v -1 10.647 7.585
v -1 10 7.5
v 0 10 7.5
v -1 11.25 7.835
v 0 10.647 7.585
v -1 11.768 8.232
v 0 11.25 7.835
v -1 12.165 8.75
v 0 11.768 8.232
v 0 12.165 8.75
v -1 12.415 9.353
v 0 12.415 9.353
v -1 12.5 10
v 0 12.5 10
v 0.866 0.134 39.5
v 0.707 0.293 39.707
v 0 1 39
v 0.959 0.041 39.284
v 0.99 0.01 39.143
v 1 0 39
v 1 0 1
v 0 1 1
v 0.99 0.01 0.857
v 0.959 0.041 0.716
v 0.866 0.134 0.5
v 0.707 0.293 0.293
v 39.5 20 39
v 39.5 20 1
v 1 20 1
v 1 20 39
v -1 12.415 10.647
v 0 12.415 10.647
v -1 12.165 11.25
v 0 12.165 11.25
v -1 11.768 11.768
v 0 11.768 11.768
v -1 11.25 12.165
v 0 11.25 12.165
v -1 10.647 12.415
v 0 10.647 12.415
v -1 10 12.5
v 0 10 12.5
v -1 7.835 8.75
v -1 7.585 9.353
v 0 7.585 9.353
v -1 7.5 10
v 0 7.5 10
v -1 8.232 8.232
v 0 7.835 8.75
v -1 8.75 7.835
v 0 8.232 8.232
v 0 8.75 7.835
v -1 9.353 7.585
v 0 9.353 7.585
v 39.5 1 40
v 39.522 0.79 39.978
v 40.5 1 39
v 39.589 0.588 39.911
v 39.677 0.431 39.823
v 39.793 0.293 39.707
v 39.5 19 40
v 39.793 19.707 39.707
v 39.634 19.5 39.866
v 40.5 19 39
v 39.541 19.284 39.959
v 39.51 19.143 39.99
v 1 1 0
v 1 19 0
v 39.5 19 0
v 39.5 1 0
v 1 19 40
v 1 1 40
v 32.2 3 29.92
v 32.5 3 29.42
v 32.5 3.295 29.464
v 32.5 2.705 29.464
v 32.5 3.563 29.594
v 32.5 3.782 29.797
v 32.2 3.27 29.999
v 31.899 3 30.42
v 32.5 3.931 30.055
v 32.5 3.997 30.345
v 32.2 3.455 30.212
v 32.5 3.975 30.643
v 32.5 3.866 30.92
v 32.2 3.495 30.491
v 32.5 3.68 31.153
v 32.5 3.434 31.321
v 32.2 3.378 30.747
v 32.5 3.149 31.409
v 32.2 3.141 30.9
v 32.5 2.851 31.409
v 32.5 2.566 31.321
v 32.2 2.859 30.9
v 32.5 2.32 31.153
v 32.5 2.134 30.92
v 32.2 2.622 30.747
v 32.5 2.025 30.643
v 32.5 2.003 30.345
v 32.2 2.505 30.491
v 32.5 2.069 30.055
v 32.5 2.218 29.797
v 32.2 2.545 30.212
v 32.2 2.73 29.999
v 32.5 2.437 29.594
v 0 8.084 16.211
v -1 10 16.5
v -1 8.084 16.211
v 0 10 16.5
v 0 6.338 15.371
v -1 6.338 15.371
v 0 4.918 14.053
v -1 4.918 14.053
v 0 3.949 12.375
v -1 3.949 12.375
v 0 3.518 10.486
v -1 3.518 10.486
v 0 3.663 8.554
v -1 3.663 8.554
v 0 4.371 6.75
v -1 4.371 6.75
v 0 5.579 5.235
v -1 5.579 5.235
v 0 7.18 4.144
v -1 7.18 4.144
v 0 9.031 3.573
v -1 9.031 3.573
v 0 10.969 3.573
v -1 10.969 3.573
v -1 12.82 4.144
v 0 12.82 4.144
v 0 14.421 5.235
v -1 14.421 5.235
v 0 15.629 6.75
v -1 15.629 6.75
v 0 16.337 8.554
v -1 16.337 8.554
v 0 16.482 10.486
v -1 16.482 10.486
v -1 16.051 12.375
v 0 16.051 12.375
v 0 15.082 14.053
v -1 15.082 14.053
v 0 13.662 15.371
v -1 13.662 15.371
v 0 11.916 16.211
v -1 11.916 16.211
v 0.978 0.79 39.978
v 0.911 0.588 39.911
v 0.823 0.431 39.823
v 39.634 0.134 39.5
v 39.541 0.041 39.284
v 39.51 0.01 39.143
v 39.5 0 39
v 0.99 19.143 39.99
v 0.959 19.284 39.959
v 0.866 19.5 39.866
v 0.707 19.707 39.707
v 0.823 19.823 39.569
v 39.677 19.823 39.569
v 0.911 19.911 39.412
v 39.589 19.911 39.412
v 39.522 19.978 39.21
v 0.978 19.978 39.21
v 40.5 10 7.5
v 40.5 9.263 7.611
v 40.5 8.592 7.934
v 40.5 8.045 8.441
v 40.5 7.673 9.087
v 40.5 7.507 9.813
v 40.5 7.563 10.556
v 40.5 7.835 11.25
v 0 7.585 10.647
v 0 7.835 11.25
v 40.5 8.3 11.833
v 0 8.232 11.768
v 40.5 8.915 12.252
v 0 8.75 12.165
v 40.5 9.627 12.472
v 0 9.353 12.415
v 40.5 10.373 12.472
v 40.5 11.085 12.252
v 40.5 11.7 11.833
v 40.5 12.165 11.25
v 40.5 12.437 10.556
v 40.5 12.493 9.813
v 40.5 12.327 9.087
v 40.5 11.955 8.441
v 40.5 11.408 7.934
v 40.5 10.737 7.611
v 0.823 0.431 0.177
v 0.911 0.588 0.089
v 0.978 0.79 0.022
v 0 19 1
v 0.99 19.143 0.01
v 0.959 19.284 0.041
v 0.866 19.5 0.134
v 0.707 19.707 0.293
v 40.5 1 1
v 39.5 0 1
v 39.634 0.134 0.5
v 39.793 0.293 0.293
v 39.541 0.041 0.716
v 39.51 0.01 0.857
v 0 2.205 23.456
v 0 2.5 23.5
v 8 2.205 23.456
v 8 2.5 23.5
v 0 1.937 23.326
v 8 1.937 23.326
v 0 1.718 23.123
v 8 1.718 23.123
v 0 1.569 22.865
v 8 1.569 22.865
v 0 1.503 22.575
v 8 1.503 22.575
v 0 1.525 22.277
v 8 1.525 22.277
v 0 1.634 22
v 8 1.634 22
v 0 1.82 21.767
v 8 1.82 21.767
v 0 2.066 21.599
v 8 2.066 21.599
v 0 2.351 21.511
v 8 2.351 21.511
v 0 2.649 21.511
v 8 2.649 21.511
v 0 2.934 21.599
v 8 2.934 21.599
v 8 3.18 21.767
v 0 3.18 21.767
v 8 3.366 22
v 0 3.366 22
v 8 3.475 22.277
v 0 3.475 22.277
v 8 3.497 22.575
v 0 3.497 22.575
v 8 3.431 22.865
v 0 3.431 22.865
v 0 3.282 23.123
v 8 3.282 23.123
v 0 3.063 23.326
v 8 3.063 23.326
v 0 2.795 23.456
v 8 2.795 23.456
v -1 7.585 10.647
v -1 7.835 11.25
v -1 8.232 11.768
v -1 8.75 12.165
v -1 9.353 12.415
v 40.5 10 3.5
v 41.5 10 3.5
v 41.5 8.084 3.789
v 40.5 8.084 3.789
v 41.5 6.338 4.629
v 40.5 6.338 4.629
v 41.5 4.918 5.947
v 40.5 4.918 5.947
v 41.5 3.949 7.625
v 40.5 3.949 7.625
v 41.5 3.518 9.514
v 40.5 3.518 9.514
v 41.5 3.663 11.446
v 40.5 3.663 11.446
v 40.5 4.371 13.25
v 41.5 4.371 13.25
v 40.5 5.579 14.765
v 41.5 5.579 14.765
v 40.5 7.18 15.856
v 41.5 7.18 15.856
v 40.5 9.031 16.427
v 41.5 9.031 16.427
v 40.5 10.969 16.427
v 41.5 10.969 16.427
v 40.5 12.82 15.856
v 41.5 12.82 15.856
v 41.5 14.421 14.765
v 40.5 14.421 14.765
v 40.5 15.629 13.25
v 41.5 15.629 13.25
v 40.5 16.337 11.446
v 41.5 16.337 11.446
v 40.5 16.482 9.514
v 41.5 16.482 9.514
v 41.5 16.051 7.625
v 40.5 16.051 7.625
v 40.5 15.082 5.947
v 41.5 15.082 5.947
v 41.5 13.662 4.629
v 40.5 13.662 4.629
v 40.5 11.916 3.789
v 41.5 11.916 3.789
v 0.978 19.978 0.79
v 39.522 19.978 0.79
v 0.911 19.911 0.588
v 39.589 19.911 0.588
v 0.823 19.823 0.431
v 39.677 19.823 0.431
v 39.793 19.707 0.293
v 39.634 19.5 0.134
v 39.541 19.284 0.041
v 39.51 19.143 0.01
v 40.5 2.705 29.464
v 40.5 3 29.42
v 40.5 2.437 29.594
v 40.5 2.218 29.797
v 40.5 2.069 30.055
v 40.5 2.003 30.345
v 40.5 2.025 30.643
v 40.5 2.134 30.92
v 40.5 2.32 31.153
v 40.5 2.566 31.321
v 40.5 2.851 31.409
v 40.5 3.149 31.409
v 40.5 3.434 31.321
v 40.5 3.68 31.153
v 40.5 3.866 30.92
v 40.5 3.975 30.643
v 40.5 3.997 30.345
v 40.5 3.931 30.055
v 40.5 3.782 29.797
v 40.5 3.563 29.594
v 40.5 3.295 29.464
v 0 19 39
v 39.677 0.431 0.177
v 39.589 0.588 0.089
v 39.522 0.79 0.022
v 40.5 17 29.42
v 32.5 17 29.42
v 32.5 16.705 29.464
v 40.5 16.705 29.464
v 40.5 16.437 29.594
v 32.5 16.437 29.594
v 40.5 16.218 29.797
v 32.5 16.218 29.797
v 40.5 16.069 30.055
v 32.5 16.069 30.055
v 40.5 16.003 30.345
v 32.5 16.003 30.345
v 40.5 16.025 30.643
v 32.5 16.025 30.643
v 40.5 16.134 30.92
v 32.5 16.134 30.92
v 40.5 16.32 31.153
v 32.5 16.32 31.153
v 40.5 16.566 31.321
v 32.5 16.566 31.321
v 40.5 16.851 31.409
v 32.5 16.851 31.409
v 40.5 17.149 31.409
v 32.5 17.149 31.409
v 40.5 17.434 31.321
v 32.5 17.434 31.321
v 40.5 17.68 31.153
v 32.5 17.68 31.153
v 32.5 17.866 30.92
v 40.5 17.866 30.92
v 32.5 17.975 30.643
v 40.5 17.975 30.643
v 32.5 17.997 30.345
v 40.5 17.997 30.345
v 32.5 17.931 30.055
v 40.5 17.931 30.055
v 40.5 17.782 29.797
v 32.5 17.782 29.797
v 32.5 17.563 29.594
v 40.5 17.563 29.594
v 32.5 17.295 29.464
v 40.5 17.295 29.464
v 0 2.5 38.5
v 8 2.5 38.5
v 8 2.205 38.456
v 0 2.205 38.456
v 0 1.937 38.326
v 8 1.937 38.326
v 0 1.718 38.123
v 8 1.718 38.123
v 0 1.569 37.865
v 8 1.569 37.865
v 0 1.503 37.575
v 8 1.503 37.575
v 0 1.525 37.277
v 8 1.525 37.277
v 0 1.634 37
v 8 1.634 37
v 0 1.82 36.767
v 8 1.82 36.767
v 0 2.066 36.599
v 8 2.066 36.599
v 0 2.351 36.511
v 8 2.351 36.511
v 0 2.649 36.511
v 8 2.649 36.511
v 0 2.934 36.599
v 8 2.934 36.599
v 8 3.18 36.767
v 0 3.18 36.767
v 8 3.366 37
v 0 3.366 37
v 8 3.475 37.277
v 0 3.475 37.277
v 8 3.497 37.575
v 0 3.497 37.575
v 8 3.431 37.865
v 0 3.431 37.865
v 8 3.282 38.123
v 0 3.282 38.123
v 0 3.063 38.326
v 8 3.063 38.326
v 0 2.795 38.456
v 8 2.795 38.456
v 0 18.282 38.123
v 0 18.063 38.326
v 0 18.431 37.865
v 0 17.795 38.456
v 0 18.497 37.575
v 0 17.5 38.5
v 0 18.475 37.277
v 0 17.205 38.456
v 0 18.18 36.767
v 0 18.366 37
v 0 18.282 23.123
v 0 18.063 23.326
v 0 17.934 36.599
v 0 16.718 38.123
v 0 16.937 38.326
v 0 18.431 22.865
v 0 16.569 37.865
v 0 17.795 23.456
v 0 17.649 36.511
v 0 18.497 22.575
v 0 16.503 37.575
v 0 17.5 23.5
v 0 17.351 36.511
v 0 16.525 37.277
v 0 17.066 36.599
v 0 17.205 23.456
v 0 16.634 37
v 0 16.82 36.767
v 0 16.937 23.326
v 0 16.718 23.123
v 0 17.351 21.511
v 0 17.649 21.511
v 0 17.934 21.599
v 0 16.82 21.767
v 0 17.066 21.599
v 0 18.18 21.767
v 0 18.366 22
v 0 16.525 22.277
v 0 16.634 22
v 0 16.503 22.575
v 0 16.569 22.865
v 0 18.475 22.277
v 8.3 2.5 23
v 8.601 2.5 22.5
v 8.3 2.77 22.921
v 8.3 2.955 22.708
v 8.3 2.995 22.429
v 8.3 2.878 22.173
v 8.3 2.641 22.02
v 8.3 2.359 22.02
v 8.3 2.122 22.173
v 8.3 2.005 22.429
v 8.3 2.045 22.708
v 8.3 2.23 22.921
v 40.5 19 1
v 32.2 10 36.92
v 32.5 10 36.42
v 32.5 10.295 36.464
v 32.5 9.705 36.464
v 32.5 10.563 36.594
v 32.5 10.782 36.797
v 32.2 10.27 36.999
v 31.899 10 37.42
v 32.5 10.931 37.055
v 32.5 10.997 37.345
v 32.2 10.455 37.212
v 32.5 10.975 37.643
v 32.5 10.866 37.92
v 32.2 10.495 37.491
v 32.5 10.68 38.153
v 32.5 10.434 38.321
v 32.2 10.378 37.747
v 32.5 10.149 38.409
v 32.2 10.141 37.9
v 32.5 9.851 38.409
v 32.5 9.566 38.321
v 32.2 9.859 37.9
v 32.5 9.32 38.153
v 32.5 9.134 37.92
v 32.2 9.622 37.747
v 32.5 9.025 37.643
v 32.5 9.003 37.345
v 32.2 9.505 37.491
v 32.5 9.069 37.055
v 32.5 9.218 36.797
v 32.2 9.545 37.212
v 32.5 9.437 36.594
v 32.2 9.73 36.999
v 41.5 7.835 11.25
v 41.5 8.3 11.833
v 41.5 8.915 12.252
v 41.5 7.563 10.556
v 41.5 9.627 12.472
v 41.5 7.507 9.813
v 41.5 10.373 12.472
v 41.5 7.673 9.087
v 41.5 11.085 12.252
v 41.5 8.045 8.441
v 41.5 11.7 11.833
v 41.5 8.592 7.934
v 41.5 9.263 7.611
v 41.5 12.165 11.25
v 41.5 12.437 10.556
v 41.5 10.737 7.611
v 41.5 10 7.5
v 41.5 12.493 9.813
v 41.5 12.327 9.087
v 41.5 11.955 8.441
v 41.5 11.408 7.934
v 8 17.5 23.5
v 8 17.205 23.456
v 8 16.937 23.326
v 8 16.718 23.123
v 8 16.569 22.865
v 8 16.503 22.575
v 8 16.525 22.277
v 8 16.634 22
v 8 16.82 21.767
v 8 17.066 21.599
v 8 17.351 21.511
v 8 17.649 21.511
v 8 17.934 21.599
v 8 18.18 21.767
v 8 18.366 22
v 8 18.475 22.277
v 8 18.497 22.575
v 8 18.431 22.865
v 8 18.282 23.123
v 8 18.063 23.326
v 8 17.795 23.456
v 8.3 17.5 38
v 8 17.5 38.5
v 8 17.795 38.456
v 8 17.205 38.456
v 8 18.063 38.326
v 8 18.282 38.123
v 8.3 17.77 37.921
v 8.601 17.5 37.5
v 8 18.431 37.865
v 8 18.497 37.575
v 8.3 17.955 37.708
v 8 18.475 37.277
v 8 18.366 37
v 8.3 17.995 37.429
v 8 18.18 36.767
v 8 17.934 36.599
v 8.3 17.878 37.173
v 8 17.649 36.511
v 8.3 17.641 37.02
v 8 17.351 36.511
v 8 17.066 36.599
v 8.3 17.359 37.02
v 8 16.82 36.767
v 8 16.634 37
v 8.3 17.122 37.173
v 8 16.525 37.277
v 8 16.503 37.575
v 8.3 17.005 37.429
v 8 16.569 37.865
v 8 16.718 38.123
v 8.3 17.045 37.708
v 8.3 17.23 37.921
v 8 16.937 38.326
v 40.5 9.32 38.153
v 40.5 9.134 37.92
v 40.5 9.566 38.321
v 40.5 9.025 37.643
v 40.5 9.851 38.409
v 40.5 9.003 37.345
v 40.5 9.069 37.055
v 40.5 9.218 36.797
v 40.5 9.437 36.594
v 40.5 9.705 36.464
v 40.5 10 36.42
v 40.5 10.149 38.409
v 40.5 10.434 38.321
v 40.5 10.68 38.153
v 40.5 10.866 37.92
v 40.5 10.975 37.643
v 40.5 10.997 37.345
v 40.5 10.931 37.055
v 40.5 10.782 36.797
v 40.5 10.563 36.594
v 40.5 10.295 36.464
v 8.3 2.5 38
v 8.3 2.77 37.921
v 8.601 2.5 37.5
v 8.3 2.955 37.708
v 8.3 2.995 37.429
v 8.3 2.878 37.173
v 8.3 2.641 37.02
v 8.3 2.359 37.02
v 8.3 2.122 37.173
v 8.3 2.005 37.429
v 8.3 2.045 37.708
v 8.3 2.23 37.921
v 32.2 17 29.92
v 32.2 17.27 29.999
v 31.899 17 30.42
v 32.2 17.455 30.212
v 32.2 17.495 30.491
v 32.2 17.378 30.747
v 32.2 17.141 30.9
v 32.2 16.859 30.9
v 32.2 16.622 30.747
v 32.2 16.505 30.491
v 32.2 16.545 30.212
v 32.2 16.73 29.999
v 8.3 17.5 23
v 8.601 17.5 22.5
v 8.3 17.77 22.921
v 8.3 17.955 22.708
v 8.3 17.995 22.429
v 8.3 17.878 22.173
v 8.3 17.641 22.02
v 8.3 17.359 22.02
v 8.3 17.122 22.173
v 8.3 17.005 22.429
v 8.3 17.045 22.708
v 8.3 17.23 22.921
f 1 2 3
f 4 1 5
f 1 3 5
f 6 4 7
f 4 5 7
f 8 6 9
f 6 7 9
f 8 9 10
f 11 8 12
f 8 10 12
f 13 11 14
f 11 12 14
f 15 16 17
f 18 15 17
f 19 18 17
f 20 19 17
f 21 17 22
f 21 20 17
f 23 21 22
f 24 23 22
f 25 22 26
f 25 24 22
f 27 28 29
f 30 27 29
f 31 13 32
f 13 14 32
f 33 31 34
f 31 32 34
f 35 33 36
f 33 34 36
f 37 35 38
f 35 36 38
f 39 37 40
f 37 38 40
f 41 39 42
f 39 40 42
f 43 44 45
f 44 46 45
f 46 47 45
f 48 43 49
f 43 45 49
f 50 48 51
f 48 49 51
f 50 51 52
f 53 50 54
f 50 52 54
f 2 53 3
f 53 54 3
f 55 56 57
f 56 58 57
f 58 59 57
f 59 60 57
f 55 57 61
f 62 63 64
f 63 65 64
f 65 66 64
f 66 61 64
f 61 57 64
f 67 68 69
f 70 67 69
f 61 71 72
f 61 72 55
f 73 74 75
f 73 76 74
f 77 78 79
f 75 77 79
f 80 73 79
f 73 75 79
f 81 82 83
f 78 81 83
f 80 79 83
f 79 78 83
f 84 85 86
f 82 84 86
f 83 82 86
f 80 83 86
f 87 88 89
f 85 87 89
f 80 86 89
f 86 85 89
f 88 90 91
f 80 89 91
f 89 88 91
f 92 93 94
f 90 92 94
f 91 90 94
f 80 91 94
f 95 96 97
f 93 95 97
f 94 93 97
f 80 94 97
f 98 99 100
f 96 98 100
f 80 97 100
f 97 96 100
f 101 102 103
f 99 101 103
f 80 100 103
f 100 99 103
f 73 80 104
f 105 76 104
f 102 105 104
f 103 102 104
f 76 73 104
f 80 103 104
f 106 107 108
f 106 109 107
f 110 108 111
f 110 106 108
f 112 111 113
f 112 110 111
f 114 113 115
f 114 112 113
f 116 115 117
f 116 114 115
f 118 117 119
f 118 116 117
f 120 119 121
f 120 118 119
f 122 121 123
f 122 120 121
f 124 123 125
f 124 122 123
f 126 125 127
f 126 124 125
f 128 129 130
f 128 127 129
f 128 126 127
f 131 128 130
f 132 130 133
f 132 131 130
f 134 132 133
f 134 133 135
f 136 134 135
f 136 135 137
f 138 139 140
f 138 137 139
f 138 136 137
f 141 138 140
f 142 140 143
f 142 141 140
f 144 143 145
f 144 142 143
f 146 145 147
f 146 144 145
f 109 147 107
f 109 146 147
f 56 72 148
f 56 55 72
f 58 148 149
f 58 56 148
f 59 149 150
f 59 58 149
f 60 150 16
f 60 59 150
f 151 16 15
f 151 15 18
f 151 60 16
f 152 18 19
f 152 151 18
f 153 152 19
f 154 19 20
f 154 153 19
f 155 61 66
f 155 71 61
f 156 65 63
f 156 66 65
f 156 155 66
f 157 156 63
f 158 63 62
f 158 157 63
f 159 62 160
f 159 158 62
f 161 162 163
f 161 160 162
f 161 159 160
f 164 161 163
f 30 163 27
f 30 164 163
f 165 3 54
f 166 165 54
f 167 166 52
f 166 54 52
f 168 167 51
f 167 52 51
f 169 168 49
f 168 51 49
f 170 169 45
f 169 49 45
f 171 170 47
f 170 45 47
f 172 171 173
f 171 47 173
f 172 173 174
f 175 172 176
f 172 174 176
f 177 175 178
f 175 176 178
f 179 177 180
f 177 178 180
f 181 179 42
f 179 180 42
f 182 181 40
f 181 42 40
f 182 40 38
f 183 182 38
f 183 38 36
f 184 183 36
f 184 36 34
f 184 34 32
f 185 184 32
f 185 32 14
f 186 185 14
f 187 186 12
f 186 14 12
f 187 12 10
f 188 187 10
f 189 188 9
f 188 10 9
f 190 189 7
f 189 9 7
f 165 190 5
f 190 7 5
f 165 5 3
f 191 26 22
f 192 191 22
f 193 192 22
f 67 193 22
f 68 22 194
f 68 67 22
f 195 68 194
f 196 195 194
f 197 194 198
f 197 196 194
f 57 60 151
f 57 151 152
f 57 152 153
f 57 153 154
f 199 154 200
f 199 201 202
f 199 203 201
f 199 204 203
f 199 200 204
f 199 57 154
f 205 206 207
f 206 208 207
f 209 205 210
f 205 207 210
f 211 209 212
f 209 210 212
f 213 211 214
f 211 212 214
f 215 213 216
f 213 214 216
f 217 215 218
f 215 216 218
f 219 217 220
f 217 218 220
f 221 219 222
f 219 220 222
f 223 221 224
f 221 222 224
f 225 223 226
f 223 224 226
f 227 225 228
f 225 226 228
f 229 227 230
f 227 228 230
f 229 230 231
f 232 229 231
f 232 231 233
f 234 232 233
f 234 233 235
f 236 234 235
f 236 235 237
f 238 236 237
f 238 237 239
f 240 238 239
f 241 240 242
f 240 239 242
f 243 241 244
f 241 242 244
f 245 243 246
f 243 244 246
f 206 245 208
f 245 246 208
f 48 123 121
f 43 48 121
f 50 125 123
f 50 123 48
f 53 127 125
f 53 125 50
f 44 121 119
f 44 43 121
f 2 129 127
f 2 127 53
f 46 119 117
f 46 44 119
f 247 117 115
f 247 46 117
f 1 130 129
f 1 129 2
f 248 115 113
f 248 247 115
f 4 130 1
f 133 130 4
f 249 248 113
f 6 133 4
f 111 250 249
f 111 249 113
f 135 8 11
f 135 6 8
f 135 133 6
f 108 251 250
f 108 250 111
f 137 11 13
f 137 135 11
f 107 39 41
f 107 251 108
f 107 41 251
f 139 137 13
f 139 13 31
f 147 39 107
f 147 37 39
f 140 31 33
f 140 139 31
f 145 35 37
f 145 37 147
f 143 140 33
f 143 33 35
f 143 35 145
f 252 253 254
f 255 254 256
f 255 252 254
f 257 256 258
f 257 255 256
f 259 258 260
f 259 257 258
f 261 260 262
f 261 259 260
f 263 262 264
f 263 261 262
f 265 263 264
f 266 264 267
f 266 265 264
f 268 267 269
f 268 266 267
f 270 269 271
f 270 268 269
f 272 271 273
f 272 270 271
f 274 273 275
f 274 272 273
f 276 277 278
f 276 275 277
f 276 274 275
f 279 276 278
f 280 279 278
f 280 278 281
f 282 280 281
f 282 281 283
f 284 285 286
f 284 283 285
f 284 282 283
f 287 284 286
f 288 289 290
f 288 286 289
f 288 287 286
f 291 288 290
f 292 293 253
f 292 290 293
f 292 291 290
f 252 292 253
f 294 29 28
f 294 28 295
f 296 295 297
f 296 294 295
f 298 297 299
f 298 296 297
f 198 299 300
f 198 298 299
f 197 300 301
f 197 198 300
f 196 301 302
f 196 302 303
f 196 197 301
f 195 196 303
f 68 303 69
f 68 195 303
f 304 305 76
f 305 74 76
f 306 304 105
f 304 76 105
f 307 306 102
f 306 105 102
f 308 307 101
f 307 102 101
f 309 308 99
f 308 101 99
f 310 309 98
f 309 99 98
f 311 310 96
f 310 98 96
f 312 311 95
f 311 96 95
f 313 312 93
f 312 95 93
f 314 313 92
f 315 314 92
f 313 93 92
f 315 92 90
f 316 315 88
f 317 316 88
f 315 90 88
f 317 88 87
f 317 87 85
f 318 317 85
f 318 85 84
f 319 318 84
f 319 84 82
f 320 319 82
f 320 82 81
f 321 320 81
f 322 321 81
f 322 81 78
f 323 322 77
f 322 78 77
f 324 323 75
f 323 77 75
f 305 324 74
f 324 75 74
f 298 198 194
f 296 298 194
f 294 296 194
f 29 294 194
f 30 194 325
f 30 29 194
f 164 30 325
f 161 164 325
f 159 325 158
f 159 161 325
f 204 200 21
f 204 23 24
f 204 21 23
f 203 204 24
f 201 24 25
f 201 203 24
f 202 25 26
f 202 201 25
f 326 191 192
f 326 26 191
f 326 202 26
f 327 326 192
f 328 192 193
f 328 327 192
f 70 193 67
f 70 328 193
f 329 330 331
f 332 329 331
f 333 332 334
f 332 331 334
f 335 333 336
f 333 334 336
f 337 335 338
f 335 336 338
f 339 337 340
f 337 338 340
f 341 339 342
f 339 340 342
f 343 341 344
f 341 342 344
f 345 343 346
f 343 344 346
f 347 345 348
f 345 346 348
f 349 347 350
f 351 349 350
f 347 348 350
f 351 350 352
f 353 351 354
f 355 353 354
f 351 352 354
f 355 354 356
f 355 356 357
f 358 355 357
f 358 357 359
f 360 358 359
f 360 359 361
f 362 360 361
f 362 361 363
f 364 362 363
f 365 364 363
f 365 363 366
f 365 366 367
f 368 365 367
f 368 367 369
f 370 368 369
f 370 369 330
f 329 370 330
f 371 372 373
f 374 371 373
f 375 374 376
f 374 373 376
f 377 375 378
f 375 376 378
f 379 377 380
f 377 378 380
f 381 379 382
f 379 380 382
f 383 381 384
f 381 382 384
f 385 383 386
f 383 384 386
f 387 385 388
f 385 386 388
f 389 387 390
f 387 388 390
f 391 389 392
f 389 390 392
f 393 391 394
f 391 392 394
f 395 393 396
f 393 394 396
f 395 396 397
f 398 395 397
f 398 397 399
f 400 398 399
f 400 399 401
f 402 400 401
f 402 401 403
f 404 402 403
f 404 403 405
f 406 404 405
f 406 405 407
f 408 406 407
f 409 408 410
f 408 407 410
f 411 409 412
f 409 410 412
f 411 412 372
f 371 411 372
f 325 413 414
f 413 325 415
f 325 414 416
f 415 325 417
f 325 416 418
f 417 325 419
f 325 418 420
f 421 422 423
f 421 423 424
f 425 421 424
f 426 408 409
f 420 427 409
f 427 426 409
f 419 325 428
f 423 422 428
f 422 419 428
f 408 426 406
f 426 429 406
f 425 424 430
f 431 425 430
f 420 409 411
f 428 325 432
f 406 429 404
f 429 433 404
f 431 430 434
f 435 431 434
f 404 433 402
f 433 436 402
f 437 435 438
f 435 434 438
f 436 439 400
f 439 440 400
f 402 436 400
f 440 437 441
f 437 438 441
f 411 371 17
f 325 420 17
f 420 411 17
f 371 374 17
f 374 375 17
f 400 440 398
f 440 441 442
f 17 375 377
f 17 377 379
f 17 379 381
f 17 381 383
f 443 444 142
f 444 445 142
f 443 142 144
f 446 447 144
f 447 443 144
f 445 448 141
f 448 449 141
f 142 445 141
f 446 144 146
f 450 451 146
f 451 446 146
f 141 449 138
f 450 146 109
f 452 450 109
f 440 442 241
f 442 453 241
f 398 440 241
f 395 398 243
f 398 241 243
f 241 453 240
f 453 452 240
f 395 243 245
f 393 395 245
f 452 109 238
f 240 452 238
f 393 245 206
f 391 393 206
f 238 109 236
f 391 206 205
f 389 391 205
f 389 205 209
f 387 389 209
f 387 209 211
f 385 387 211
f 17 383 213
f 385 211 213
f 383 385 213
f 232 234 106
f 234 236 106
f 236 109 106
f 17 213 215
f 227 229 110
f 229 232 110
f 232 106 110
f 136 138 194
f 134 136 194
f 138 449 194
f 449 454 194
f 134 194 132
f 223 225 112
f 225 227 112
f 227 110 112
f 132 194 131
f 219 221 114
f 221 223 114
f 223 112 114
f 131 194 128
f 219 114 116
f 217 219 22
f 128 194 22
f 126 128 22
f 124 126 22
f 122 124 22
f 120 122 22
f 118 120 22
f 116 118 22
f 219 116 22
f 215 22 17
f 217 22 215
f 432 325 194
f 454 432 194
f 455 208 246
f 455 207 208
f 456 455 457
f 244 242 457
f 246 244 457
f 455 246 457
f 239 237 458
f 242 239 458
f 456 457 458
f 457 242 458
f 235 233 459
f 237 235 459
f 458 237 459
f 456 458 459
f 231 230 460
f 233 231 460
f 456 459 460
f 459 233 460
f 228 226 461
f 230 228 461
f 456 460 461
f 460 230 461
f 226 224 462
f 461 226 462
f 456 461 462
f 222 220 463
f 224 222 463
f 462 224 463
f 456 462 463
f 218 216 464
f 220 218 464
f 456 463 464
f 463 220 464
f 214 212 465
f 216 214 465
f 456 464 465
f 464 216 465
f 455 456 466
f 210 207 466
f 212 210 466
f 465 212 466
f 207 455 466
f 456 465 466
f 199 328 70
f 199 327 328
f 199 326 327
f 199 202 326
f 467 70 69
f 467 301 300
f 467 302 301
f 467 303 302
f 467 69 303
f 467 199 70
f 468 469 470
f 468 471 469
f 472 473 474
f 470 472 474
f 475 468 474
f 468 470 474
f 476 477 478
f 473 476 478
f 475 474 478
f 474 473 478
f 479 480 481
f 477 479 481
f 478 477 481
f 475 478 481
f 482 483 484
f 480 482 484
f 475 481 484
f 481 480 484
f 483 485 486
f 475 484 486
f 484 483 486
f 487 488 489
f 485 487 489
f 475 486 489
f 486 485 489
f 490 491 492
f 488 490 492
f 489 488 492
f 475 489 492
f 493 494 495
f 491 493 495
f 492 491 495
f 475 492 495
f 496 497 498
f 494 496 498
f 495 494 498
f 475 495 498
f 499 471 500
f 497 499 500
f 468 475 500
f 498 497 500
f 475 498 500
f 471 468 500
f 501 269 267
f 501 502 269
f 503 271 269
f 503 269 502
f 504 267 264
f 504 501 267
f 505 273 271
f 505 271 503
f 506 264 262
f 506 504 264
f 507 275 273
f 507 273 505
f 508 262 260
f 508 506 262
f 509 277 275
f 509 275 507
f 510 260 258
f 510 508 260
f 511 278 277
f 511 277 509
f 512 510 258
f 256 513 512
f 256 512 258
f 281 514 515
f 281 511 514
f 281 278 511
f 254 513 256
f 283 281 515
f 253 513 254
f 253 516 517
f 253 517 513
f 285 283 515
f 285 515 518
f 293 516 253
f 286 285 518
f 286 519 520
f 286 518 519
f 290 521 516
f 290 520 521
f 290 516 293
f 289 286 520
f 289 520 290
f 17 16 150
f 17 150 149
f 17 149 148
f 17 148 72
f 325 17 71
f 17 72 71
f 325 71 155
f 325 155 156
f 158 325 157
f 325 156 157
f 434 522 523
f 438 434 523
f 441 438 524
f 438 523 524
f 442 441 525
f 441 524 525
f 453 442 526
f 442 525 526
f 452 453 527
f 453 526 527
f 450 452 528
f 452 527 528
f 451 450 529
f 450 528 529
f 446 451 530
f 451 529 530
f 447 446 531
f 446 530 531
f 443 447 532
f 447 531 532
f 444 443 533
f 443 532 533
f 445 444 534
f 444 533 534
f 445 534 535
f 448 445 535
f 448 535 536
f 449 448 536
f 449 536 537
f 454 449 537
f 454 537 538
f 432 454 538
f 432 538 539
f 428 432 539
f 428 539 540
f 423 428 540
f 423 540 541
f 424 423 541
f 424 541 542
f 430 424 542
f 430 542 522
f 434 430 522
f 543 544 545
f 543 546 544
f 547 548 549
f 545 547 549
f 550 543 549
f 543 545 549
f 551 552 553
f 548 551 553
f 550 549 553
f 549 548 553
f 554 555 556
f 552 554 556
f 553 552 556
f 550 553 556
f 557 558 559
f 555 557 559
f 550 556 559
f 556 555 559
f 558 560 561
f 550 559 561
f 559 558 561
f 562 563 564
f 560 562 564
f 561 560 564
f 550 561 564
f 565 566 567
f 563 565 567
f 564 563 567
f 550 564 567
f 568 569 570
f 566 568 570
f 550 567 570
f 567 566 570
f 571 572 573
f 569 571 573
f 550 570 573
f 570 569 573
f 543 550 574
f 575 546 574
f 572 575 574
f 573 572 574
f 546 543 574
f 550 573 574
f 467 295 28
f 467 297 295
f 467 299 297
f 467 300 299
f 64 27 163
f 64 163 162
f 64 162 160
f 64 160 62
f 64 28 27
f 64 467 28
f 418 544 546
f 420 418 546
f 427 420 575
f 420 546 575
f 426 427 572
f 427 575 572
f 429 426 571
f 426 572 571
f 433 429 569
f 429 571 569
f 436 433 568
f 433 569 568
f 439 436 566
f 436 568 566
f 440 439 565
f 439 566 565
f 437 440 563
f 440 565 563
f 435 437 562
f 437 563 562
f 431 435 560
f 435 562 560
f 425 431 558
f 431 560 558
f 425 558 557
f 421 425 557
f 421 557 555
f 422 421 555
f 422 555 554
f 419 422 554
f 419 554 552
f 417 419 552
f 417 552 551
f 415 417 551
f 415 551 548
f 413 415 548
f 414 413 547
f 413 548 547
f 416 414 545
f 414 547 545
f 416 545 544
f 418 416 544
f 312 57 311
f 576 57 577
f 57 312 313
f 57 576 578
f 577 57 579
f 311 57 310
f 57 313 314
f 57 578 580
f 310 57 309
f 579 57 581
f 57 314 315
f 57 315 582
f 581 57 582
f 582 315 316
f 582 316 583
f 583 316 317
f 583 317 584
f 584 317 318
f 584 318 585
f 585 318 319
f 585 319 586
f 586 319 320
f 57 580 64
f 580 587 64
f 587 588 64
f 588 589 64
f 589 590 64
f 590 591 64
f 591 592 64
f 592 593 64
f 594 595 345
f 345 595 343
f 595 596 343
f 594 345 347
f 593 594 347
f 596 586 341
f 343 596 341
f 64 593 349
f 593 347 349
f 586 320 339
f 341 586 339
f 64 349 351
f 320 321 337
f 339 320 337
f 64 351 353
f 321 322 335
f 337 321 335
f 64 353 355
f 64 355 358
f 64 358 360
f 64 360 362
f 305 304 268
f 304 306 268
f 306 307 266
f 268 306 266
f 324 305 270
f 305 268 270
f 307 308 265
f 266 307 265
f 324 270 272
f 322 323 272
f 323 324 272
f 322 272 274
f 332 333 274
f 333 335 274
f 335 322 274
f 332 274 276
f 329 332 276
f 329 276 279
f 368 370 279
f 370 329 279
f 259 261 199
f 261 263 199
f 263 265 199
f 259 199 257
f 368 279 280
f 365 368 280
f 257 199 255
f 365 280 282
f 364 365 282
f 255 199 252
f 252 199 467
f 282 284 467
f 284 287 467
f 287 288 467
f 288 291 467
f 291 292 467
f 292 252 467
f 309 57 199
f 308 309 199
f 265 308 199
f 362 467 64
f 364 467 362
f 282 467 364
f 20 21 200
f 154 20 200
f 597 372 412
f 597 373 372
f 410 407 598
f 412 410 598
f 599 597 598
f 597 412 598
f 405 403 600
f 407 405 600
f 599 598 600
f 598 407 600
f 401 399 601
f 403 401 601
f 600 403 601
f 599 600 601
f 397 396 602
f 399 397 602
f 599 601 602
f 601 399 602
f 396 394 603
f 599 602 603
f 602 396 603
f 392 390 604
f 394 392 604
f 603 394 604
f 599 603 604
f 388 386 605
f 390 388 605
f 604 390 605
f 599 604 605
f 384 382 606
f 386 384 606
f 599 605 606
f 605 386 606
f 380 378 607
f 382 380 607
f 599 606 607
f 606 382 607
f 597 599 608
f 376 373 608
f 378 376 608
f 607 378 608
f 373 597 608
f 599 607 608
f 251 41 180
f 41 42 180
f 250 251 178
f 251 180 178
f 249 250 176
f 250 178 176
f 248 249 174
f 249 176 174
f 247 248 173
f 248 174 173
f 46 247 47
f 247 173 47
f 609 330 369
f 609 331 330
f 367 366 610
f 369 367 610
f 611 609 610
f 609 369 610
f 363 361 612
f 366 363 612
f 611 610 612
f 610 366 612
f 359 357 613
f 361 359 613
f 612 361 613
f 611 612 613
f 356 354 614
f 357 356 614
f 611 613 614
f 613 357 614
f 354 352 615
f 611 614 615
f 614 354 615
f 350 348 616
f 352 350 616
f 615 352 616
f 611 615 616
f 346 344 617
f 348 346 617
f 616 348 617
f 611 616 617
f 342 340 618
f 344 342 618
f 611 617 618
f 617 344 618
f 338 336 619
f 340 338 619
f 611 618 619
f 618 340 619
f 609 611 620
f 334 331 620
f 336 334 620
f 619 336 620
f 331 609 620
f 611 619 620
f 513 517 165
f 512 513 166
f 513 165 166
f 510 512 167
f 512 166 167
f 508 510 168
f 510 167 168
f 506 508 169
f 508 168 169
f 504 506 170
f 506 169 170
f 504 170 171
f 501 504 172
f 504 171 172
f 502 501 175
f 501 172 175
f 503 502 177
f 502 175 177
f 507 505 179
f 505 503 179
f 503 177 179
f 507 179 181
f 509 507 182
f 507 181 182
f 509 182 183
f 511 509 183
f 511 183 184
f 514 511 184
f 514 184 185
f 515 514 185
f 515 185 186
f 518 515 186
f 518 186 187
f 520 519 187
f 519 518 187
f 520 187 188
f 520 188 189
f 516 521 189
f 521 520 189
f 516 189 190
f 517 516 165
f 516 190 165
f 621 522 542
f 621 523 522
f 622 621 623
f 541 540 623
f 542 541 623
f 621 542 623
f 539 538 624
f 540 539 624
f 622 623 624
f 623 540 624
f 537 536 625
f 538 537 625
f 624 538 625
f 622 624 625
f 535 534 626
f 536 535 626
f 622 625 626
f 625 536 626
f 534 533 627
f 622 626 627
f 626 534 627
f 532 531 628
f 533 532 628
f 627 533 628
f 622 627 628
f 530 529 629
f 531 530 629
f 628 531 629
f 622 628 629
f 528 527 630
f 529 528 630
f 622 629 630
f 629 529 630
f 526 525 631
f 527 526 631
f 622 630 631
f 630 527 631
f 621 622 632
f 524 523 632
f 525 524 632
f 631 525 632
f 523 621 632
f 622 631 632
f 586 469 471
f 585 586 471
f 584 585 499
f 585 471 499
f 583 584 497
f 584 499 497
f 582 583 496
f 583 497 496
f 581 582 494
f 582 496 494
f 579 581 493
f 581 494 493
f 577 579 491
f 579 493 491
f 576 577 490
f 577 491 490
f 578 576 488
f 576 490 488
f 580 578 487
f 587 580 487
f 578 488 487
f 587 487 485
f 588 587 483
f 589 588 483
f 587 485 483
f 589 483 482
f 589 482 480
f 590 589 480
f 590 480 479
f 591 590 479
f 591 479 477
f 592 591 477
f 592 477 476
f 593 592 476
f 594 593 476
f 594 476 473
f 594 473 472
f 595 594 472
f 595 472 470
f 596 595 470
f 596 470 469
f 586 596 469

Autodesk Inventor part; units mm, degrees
ref_plane "YZ Plane" through (0, 0, 0) normal (1, 0, 0) x (0, 1, 0)
ref_plane "XZ Plane" through (0, 0, 0) normal (0, 1, 0) x (-1, 0, 0)
ref_plane "XY Plane" through (0, 0, 0) normal (0, 0, 1) x (1, 0, 0)
sketch "スケッチ1" plane through (0, 0, 0) normal (0, 0, 1) x (1, 0, 0)
  line L0 (0, 0) -> (40.5, 0)
  line L1 (40.5, 0) -> (40.5, 20)
  line L2 (40.5, 20) -> (0, 20)
  line L3 (0, 20) -> (0, 0)
  dimension "d0" = 40.5
  dimension "d1" = 20
extrude "押し出し1" add sketch "スケッチ1" along normal blind 40
sketch "スケッチ2" plane through (40.5, 0, 0) normal (1, 0, 0) x (0, 0, -1)
  circle A0 centre (-10, 10) radius 10
  line L0 (0, 0) -> (0, 20) projected
  line L1 (0, 10) -> (-40, 10)
  line L2 (-40, 0) -> (-40, 20) projected
  dimension "d4" = 20
hole "穴1" at (40.5, 10, 10) direction (-1, 0, 0) diameter 5 end through all
sketch "スケッチ3" plane through (40.5, 0, 0) normal (1, 0, 0) x (0, 0, -1)
  circle A0 centre (-10, 10) radius 6.5
  line L0 (0, 20) -> (0, 0) projected
  line L1 (0, 10) -> (-40, 10)
  line L2 (-40, 20) -> (-40, 0) projected
  circle A1 centre (-10, 10) radius 2.5 projected
  line L3 (-10, 12.5) -> (-10, 7.5)
  dimension "d12" = 13
extrude "押し出し2" add sketch "スケッチ3" along normal blind 1 contours L1 A1 A0 | A0 L1 A1
sketch "スケッチ4" plane through (0, 0, 0) normal (-1, 0, 0) x (0, 0, 1)
  circle A0 centre (10, 10) radius 2.5 projected
  line L0 (10, 12.5) -> (10, 7.5)
  line L1 (12.5, 10) -> (7.5, 10)
  circle A1 centre (10, 10) radius 6.5
  point P0 (0, 0)
  dimension "d15" = 13
extrude "押し出し3" add sketch "スケッチ4" along normal blind 1
chamfer "面取り1" distance 1 angle 45 4 edges at (0, 20, 20) (40.5, 20, 20) (0, 0, 20) (40.5, 0, 20)
chamfer "面取り2" distance 1 angle 45 4 edges at (40.5, 10, 0) (0, 10, 0) (40.5, 10, 40) (0, 10, 40)
fillet "フィレット1" radius 1 4 edges at (20.25, 20, 40) (20.25, 0, 40) (20.25, 20, 0) (20.25, 0, 0)
sketch "スケッチ5" plane through (0, 1, 39) normal (-1, 0, 0) x (0, 0, 1)
  line L0 (-1.5, 16.5) -> (-16.5, 16.5)
  line L1 (-16.5, 16.5) -> (-16.5, 1.5)
  line L2 (-16.5, 1.5) -> (-1.5, 1.5)
  line L3 (-1.5, 1.5) -> (-1.5, 16.5)
  line L4 (0, 19) -> (-38, 19) projected
  line L5 (0, 18) -> (0, 0) projected
  point P0 (-39, -1)
  dimension "d25" = 15
  dimension "d26" = 2.5
  dimension "d27" = 15
  dimension "d45" = 1.5
hole "穴2" at (0, 17.5, 22.5) at (0, 2.5, 22.5) at (0, 17.5, 37.5) at (0, 2.5, 37.5) direction (1, 0, 0) diameter 2 depth 8 tip angle 118
sketch "スケッチ6" plane through (40.5, 1, 39) normal (1, 0, 0) x (0, 0, -1)
  circle A0 centre (8.58, 9) radius 7
  line L0 (-1, 0) -> (-1, 18) projected
  line L1 (-1, 9) -> (38.1448, 9)
  line L2 (8.58, 16) -> (8.58, 2)
  line L3 (39, 0) -> (39, 18) projected
  point P0 (39, -1)
  point P1 (1.58, 9)
  dimension "d36" = 14
  dimension "d37" = 30.42
hole "穴3" at (40.5, 10, 37.42) at (40.5, 17, 30.42) at (40.5, 3, 30.42) direction (-1, 0, 0) diameter 2 depth 8 tip angle 118
properties part number "サーボパーツ1"
